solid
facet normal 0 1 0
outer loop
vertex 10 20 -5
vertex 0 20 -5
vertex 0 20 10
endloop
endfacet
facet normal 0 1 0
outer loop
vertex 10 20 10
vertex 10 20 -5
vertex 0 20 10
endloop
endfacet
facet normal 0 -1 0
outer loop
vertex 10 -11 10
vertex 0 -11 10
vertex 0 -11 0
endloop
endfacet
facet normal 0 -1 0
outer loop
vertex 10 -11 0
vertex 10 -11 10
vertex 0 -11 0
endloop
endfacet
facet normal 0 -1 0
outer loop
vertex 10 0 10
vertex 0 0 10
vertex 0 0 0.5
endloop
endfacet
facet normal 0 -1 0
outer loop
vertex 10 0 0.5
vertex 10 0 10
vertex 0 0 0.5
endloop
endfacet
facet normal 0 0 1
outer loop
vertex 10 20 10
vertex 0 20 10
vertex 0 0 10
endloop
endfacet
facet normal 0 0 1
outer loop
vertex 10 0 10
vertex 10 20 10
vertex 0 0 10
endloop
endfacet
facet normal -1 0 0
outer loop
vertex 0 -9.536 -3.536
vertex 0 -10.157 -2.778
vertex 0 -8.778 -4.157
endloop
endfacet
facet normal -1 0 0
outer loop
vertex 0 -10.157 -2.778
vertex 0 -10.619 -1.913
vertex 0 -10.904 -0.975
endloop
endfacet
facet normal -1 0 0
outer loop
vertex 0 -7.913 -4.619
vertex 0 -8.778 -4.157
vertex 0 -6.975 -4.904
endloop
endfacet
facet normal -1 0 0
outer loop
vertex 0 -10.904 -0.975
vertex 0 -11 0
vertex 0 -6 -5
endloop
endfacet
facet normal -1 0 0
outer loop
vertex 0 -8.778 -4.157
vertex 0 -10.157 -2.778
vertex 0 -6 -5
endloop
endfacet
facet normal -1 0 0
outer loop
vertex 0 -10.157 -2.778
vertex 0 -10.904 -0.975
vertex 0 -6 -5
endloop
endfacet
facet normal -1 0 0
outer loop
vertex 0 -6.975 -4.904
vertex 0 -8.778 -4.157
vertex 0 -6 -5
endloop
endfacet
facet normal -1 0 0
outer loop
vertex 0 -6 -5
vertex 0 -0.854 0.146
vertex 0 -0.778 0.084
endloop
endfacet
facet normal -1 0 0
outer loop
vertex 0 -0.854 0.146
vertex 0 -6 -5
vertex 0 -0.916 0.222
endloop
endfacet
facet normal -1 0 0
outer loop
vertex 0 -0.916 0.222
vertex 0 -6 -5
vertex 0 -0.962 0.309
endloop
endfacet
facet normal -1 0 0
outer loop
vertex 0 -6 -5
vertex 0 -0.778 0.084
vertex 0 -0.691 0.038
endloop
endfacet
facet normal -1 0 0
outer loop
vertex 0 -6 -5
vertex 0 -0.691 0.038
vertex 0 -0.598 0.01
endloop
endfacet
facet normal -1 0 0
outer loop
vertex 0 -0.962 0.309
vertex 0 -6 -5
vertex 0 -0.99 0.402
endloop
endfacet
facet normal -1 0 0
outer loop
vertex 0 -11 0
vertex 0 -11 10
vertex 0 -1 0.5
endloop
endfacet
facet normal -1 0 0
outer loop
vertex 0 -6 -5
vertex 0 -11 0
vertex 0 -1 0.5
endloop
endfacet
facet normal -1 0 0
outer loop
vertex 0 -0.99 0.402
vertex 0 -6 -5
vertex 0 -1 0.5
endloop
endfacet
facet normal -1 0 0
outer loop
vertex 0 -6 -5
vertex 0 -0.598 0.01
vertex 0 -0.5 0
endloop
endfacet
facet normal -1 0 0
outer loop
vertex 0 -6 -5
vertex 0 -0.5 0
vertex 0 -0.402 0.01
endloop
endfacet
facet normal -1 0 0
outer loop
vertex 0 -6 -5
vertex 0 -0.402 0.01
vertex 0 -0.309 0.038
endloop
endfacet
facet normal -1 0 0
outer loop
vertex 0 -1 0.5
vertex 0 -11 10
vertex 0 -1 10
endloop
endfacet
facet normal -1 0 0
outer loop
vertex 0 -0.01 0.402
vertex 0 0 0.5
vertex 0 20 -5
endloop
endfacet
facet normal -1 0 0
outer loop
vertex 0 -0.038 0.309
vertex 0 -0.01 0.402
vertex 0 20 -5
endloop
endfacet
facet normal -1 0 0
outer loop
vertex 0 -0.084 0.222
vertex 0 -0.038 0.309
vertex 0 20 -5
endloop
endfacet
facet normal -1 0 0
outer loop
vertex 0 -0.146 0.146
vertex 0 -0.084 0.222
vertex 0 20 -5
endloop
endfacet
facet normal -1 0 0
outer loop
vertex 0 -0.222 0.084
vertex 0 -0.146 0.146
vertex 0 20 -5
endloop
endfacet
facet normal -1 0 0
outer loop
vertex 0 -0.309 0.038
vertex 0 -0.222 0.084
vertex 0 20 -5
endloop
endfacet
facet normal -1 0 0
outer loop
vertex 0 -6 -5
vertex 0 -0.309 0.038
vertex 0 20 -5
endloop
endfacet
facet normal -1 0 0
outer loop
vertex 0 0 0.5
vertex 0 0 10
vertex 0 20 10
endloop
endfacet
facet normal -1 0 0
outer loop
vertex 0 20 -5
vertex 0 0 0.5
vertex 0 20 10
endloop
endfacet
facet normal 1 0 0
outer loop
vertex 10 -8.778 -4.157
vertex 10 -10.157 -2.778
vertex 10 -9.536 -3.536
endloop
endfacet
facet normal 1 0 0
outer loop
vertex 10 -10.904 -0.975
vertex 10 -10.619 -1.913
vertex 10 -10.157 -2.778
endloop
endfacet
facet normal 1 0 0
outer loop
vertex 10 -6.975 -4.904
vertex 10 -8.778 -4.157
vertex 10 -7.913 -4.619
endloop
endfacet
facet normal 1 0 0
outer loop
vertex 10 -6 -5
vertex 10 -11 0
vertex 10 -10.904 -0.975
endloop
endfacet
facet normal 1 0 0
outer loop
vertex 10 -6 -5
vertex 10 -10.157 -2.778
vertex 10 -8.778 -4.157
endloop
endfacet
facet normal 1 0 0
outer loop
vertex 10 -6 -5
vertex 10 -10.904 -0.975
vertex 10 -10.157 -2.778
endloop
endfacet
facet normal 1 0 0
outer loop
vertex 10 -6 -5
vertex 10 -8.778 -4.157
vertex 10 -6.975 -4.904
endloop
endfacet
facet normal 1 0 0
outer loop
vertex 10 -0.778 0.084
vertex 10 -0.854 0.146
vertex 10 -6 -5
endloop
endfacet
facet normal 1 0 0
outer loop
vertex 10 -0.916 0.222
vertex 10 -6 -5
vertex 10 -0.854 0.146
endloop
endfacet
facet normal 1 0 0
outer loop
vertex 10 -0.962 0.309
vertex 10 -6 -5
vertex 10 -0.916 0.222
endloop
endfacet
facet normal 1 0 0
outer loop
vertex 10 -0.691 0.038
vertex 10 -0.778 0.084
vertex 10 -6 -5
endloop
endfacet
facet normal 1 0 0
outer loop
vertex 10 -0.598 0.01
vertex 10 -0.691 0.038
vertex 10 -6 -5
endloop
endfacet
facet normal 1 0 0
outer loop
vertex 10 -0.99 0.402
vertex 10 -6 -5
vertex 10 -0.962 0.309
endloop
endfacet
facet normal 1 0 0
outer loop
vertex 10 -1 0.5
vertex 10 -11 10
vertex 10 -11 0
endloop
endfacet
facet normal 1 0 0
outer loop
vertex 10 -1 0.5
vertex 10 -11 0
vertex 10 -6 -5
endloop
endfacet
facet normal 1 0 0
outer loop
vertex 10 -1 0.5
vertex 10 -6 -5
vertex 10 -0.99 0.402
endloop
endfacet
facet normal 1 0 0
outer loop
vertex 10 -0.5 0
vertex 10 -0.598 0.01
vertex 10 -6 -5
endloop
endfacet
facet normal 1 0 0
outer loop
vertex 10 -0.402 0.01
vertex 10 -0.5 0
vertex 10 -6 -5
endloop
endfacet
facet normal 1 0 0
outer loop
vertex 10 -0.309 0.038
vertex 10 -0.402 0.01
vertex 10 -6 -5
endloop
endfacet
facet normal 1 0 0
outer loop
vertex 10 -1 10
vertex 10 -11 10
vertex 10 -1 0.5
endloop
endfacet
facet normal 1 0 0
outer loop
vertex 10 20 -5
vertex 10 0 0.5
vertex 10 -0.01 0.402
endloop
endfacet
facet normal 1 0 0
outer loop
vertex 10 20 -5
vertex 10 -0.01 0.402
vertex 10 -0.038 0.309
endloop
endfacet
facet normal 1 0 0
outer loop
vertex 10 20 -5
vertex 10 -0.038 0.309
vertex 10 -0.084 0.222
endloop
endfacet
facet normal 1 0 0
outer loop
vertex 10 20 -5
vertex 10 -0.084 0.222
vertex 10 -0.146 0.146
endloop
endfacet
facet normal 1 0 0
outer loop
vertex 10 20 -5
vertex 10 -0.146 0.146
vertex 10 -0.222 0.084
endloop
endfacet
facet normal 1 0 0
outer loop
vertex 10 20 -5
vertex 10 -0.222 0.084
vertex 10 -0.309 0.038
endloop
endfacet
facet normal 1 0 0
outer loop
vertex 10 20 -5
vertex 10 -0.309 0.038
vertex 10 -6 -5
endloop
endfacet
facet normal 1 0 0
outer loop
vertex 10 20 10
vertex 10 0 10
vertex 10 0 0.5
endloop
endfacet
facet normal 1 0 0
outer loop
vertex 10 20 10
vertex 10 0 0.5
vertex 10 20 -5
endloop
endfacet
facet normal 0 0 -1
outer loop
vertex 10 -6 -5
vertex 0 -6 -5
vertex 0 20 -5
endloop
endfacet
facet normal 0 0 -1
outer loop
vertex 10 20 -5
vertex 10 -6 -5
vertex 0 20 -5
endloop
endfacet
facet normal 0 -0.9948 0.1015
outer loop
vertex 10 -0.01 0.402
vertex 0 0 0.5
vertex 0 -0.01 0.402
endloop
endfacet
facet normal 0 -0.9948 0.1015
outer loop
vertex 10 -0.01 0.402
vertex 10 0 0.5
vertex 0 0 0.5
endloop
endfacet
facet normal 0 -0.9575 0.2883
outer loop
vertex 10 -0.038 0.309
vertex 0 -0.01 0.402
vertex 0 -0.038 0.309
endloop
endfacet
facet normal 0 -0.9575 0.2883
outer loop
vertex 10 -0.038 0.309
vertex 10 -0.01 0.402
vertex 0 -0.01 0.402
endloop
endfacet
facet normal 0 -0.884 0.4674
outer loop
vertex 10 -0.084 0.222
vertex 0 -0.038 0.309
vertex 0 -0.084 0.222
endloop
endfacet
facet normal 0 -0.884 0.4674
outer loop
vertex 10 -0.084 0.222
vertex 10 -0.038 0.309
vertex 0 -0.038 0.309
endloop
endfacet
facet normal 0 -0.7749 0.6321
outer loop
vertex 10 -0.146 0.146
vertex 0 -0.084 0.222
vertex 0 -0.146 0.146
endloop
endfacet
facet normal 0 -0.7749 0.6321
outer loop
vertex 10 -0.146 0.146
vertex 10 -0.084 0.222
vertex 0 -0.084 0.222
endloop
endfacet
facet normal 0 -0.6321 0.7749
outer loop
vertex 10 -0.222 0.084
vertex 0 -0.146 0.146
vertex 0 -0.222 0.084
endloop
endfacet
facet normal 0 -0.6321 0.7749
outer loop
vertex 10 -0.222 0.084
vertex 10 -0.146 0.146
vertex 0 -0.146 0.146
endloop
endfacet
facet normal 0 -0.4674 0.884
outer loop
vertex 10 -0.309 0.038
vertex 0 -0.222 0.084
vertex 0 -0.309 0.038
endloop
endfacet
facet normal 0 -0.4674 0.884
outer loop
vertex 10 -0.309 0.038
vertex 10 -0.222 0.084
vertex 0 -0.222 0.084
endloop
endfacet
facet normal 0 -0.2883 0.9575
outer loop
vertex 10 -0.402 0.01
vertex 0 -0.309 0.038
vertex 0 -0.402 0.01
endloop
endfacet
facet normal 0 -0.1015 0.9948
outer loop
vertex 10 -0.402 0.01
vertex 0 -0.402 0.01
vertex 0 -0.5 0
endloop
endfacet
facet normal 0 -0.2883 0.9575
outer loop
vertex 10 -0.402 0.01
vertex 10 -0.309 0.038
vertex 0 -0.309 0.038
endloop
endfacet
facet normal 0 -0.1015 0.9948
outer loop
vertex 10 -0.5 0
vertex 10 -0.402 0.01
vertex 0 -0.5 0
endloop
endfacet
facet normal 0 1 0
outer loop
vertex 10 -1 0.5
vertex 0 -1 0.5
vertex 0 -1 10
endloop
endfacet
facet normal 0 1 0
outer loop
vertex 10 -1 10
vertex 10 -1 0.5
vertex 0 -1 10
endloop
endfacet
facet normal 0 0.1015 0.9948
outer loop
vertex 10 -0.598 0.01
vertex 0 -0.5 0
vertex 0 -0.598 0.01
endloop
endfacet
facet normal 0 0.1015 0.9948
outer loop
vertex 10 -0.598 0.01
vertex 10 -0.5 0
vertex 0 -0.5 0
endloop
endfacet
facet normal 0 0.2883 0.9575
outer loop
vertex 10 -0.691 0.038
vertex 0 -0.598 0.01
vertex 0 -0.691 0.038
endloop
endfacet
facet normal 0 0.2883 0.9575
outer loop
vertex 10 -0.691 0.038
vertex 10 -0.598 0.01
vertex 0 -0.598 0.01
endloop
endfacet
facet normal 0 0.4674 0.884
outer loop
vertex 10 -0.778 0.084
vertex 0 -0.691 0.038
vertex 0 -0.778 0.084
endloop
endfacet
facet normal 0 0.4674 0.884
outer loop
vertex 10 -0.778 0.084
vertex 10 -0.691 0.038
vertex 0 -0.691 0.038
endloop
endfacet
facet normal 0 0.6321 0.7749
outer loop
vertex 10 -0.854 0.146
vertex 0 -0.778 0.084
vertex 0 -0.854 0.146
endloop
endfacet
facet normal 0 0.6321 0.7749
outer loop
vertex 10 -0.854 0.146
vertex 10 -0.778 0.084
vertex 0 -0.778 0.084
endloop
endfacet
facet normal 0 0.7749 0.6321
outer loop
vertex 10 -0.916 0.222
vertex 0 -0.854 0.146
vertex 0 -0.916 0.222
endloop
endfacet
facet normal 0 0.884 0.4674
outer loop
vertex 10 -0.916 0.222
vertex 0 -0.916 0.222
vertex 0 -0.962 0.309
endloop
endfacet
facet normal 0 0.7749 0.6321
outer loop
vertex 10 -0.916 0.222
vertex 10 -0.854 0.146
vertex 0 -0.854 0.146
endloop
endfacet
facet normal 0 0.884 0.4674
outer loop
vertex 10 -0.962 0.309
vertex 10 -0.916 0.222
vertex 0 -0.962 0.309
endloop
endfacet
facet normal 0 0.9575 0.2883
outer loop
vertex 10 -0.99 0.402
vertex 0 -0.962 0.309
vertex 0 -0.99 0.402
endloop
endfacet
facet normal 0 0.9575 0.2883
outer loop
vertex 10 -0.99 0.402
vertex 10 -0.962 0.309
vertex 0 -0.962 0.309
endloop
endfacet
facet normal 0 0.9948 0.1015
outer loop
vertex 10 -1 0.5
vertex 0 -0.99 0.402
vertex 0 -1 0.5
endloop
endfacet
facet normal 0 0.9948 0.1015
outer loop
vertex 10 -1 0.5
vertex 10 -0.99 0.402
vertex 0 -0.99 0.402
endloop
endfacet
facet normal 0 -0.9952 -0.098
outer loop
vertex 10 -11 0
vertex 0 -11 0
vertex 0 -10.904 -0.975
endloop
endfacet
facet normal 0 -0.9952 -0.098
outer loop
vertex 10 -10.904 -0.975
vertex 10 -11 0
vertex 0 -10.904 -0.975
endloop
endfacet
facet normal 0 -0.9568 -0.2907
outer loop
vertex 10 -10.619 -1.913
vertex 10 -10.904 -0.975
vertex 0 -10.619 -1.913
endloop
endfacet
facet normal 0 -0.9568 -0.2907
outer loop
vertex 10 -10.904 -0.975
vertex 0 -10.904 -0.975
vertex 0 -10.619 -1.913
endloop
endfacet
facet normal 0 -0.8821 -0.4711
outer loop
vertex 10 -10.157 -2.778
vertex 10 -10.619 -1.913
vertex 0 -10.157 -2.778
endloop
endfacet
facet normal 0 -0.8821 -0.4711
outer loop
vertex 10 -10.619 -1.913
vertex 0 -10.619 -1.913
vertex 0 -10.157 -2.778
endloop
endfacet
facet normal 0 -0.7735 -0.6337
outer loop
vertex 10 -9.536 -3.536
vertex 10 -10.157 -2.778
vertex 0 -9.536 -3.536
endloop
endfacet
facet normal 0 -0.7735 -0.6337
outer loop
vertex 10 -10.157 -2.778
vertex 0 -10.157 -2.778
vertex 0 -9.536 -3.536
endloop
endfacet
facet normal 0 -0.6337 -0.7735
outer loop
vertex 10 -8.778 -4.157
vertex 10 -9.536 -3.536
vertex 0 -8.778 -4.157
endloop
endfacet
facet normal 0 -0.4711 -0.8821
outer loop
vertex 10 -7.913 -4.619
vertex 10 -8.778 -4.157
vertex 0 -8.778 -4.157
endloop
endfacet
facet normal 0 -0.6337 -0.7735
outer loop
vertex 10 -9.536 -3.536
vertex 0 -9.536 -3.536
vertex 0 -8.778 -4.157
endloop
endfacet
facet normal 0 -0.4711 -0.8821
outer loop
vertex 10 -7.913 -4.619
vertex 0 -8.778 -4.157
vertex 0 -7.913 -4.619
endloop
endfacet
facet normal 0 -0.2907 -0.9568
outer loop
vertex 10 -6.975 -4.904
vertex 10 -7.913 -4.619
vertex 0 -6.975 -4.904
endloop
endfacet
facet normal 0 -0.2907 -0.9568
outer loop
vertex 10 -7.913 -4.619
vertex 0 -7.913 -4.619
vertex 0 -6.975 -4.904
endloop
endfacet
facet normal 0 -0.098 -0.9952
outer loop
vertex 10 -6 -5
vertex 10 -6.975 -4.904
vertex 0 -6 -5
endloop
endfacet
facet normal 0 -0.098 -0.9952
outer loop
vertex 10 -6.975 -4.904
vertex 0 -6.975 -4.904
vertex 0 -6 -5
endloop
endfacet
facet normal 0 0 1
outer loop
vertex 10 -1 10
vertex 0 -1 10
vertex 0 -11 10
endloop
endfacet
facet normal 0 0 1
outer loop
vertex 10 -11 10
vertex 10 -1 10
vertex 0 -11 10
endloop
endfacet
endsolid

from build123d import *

# Parameters (mm, degrees)
F0_W     = 1
F0_H     = 5
F1_DEPTH = 10
F2_R     = 0.49999


# Not quite as in the source:
# - a fillet or chamfer is up to 0.001 mm smaller than in the source, because OpenCascade refuses the exact size


with BuildPart() as f1:
    # F0 (on Right) → F1 (new body)
    with BuildSketch(Plane.YZ):
        Polygon((20, -5), (20, 10), (0, 10), (0, 0), (0, -5), align=None)
        with Locations((-0.5, -2.5)):
            Rectangle(F0_W, F0_H)
        with BuildLine():
            Line((-1, -5), (-1, 0))
            Line((-1, 0), (-1, 10))
            Line((-1, 10), (-11, 10))
            Line((-11, 10), (-11, 0))
            ThreePointArc((-11, 0), (-9.5355339059, -3.5355339059), (-6, -5))
            Line((-6, -5), (-1, -5))
        make_face()
    extrude(amount=F1_DEPTH)

    # F2 (radius 0.5 in the source; OpenCascade refuses exactly that, so slightly less here)
    f2_edges = [f1.edges().sort_by_distance(p)[0] for p in [
        (5, 0, 0),
        (5, -1, 0),
    ]]
    fillet(f2_edges, radius=F2_R)


solid = f1.part
